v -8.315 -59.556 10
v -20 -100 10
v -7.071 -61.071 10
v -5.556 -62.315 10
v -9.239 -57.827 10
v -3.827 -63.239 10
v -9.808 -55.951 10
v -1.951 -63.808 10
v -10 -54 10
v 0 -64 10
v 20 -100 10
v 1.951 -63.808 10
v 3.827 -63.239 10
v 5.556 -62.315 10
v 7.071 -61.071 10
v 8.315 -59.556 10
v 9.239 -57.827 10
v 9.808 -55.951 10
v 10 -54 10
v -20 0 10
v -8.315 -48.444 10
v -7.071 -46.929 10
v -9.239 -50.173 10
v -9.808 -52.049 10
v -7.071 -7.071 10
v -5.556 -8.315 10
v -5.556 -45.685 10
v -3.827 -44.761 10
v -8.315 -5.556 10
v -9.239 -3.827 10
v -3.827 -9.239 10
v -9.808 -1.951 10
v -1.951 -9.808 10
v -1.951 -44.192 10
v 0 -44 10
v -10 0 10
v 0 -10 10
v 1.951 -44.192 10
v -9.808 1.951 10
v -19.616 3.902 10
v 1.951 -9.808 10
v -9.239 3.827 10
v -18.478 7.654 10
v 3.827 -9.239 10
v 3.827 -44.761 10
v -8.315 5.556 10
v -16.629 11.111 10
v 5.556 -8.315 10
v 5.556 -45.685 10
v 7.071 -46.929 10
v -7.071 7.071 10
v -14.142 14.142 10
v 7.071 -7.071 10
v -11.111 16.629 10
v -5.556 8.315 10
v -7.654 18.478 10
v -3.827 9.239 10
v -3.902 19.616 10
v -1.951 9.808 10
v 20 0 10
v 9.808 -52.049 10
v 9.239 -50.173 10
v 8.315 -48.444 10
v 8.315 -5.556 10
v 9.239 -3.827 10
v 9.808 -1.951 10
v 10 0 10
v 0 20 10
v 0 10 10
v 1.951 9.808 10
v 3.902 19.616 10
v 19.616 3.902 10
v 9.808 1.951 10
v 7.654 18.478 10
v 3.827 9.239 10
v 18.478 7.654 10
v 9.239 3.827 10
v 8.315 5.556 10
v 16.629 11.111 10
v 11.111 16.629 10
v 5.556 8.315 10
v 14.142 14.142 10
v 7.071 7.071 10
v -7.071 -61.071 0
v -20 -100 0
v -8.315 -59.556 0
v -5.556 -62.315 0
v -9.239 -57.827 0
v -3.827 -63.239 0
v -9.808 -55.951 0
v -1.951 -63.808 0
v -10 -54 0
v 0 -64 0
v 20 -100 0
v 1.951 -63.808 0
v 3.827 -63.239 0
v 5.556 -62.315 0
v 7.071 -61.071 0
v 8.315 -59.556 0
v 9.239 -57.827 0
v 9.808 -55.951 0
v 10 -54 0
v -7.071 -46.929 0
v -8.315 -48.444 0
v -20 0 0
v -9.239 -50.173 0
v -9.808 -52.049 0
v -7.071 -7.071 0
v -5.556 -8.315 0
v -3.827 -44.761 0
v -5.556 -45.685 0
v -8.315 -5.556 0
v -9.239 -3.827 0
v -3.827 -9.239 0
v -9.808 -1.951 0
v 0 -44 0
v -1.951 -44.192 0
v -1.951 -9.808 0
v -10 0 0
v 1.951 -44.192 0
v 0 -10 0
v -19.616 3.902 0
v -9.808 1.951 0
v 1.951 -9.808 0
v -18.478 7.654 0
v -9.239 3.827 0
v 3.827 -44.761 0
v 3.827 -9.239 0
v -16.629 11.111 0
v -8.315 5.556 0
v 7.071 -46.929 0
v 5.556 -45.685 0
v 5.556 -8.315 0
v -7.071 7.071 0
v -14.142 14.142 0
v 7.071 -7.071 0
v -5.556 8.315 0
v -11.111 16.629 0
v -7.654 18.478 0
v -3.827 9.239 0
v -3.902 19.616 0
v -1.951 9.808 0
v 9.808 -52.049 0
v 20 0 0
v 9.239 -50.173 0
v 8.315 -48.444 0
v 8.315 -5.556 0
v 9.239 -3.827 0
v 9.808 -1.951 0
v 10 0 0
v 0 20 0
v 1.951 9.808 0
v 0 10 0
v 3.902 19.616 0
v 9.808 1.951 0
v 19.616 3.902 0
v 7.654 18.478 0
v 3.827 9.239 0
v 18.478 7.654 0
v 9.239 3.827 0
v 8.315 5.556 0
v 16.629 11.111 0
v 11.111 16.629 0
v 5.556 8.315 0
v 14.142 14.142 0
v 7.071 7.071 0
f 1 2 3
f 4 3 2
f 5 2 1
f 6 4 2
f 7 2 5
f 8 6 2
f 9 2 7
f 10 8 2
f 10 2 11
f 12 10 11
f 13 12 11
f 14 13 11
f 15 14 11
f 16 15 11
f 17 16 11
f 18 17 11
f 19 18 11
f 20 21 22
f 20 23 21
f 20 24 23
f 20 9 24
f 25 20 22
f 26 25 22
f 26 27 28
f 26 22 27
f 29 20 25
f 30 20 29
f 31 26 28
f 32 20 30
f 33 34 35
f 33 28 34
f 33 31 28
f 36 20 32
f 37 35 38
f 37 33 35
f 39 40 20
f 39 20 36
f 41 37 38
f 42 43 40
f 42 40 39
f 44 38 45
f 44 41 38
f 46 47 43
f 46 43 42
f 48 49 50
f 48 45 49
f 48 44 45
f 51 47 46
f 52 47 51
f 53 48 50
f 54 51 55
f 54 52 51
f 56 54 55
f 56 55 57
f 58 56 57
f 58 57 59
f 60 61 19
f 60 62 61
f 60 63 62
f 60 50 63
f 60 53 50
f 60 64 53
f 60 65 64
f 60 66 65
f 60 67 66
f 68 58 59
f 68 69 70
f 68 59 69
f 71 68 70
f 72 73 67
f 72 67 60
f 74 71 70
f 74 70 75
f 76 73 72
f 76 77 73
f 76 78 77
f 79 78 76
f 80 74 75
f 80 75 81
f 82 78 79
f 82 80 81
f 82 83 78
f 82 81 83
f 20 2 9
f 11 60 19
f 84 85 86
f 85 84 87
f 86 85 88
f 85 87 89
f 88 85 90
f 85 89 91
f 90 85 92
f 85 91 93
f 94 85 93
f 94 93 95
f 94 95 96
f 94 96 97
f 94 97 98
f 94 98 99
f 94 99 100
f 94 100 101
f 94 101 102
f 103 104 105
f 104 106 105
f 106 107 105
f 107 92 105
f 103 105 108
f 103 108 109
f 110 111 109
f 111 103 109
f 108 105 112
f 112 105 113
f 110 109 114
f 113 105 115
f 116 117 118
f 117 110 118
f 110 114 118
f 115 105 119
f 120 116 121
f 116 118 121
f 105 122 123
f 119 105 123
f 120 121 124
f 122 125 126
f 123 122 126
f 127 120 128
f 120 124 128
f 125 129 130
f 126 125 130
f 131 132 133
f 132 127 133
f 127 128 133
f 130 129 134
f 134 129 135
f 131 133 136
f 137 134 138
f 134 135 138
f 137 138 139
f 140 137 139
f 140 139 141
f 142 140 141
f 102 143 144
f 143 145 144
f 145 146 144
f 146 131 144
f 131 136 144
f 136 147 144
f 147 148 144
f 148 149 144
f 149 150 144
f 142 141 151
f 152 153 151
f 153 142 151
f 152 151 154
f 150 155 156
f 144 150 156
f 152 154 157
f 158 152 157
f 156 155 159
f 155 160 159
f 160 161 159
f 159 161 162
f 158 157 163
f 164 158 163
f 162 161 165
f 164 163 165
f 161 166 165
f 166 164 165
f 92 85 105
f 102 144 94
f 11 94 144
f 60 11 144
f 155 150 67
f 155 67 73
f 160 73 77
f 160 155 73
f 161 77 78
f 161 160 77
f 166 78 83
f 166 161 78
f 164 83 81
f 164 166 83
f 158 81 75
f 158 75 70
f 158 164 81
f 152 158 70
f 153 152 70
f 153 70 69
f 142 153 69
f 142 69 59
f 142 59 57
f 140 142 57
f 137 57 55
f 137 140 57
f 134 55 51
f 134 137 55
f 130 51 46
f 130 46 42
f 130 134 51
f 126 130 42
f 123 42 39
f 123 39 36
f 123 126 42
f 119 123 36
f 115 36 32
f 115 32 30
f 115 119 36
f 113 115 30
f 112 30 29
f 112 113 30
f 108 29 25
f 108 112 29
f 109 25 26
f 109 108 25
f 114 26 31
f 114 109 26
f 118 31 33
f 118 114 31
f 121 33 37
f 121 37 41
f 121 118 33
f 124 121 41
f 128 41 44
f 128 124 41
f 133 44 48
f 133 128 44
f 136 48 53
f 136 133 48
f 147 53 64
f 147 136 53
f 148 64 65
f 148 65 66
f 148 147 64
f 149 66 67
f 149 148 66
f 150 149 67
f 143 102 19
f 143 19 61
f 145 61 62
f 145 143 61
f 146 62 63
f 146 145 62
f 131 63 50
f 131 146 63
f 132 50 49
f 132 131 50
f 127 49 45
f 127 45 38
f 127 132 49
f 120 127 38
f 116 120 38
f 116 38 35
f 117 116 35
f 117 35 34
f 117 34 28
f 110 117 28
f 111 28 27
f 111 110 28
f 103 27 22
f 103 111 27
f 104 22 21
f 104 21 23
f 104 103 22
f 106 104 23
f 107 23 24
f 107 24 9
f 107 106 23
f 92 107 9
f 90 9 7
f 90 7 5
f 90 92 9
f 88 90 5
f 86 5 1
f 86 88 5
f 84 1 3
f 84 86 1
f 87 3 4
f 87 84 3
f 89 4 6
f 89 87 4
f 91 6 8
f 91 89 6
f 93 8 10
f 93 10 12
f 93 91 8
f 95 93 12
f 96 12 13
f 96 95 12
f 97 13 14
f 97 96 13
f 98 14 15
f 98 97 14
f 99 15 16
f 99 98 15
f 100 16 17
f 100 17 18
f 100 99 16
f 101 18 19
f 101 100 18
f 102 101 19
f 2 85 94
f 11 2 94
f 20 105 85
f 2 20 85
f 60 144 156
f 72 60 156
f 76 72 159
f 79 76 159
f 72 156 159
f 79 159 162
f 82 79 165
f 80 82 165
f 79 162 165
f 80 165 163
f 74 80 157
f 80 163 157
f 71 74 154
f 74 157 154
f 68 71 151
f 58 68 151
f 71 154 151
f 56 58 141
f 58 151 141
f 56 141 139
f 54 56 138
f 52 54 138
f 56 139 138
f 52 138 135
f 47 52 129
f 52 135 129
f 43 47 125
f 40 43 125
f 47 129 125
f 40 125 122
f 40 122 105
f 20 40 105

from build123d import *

# Parameters (mm, degrees)
SKETCH_1_R      = 10
EXTRUDE_2_DEPTH = 10


with BuildPart() as part:
    # 草图1 → 凸台-拉伸2 (new body)
    with BuildSketch(Plane.XY):
        with BuildLine():
            ThreePointArc((20, 0), (0, 20), (-20, 0))
            Line((-20, 0), (-20, -100))
            Line((-20, -100), (20, -100))
            Line((20, -100), (20, 0))
        make_face()
        Circle(SKETCH_1_R, mode=Mode.SUBTRACT)
        with Locations((0, -54)):
            Circle(SKETCH_1_R, mode=Mode.SUBTRACT)
    extrude(amount=EXTRUDE_2_DEPTH)


solid = part.part
